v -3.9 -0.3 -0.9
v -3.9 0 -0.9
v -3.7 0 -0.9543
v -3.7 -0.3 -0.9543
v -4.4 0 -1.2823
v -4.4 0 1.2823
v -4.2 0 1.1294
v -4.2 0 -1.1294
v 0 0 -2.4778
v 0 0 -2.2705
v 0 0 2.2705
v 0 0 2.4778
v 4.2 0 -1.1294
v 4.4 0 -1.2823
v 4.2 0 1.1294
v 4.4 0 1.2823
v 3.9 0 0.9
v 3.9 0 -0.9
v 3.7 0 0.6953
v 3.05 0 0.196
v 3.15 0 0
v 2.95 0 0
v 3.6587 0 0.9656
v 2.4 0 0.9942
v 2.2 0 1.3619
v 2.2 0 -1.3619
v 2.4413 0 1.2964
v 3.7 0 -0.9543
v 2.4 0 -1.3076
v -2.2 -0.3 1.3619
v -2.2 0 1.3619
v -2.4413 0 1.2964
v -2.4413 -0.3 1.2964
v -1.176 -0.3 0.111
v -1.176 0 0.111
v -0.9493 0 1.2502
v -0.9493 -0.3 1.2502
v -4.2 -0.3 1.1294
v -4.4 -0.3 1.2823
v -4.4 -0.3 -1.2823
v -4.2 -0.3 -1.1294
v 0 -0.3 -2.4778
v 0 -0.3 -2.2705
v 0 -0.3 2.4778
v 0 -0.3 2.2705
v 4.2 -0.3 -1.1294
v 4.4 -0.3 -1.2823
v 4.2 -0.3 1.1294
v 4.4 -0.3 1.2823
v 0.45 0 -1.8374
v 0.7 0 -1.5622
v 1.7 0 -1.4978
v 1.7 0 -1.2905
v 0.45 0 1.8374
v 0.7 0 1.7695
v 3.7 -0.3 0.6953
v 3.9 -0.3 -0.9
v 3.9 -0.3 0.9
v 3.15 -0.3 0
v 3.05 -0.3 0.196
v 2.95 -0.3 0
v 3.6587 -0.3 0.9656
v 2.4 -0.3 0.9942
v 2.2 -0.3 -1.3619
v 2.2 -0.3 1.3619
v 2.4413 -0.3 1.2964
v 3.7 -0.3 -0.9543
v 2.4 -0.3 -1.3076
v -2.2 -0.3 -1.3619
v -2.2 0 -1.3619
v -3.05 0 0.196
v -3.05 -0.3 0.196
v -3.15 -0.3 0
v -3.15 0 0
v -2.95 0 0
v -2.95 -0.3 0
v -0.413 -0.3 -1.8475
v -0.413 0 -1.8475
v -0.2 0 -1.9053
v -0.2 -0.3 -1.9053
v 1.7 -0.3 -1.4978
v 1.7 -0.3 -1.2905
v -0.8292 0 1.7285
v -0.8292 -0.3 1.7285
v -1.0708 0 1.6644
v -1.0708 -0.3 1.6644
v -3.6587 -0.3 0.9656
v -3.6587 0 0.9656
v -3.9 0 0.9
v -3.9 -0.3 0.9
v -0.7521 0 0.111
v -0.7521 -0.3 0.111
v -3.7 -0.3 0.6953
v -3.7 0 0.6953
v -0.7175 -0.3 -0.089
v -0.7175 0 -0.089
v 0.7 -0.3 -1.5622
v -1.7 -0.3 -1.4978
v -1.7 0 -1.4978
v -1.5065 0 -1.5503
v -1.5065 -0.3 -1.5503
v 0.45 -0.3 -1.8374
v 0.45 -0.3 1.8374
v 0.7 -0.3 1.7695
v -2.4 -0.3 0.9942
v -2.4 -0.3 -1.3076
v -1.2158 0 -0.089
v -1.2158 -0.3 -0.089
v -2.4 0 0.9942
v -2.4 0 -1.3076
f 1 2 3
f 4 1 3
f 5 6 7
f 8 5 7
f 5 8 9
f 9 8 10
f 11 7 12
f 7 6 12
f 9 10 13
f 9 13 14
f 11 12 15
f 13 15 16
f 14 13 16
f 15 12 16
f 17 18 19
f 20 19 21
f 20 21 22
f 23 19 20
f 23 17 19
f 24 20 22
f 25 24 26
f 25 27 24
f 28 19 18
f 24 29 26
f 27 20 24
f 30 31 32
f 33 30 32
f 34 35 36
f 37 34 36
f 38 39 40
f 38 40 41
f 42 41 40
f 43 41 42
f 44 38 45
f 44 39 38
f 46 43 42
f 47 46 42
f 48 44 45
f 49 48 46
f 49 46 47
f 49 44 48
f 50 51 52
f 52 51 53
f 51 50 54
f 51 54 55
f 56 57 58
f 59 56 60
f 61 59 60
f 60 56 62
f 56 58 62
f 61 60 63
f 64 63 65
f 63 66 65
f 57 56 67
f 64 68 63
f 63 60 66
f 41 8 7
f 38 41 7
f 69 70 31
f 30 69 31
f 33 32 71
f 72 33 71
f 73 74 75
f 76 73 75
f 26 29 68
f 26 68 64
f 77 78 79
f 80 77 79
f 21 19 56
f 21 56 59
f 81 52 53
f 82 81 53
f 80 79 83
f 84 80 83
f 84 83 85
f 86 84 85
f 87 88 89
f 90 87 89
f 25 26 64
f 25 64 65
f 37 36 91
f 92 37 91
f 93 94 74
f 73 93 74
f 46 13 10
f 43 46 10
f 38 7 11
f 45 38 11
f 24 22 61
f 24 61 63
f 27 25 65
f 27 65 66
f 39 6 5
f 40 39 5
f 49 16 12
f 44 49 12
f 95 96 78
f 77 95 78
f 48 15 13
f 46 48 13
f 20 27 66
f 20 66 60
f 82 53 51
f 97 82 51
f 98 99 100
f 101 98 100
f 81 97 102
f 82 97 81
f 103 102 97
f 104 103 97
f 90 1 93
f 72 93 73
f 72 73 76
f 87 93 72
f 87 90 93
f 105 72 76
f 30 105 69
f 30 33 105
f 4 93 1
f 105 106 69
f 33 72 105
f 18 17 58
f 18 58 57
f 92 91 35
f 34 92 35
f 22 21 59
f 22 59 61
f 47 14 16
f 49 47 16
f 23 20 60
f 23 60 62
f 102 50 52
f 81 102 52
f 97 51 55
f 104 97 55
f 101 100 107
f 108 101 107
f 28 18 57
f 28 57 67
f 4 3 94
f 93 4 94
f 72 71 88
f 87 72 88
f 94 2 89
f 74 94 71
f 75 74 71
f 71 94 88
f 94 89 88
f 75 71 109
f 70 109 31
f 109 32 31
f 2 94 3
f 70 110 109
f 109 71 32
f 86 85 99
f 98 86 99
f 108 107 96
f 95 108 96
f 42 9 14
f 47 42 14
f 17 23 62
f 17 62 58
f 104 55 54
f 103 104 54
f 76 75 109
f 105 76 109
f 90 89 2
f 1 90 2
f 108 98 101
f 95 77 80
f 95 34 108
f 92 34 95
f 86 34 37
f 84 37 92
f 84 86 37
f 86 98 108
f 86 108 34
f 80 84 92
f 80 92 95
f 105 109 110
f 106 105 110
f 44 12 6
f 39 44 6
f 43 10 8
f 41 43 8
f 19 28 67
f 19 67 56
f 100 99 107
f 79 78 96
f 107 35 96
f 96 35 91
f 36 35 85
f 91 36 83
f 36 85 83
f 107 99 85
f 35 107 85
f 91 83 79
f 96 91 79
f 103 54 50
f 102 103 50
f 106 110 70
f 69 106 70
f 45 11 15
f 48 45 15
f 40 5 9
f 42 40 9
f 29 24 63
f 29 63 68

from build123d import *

# Parameters (mm, degrees)
F1_DEPTH = 0.3
F4_DEPTH = 0.3
F6_DEPTH = 0.3


with BuildPart() as f1:
    # F0 (on Front) → F1 (new body)
    with BuildSketch(Plane.XZ):
        Polygon((-3.9, -0.9), (-3.7, -0.9543419613), (-3.7, 0), (-3.9, 0), align=None)
        Polygon((-3.05, 0.1959599852), (-3.6587468421, 0.9655508489), (-3.9, 0.9), (-3.9, 0), (-3.7, 0), (-3.7, 0.6953218411), (-3.15, 0), (-3.05, 0), align=None)
        Polygon((-2.2, 0), (-2.2, 1.3619066714), (-2.4412531579, 1.2963558225), (-3.05, 0.1959599852), (-3.05, 0), (-2.95, 0), (-2.4, 0.9942026285), (-2.4, 0), align=None)
        Polygon((-2.2, -1.3619066714), (-2.2, 0), (-2.4, 0), (-2.4, -1.3075647101), align=None)
    extrude(amount=F1_DEPTH)


with BuildPart() as f1b:
    # F0 (on Front) → F1, piece 2 (new body)
    with BuildSketch(Plane.XZ):
        Polygon((-1.0708318389, 1.6644389552), (-1.7, -1.4977615747), (-1.5065383963, -1.5503269897), (-1.2157824465, -0.0889869615), (-1.1759893875, 0.1110130385), (-0.9493335993, 1.2501855171), (-0.7520927493, 0.1110130385), (-0.7174639545, -0.0889869615), (-0.4129961309, -1.8474531472), (-0.2, -1.9053262848), (-0.8291681611, 1.7284597866), align=None)
        Polygon((-1.1759893875, 0.1110130385), (-1.2157824465, -0.0889869615), (-0.7174639545, -0.0889869615), (-0.7520927493, 0.1110130385), align=None)
    extrude(amount=F1_DEPTH)


with BuildPart() as f2_1:
    # F2: instance of F1
    add(f1.part.mirror(Plane.YZ))


with BuildPart() as f4:
    # F3 (on Front) → F4 (new body)
    with BuildSketch(Plane.XZ):
        Polygon((0.7, -1.5622202083), (0.7, 1.7694713814), (0.45, 1.8373988331), (0.45, -1.63014766), align=None)
        Polygon((1.7, -1.4977615747), (1.7, -1.2905104016), (0.7, -1.5622202083), (0.45, -1.63014766), (0.45, -1.8373988331), align=None)
    extrude(amount=F4_DEPTH)


with BuildPart() as f6:
    # F5 (on Front) → F6 (new body)
    with BuildSketch(Plane.XZ):
        Polygon((4.4, 1.2822730295), (0, 2.477796179), (-4.4, 1.2822730295), (-4.4, -1.2822730295), (0, -2.477796179), (4.4, -1.2822730295), (4.4, 0), align=None)
        Polygon((4.2, -1.1293638177), (0, -2.2705450058), (-4.2, -1.1293638177), (-4.2, 1.1293638177), (0, 2.2705450058), (4.2, 1.1293638177), (4.2, 0), align=None, mode=Mode.SUBTRACT)
    extrude(amount=F6_DEPTH)


solid = Compound([f1.part, f1b.part, f2_1.part, f4.part, f6.part])
